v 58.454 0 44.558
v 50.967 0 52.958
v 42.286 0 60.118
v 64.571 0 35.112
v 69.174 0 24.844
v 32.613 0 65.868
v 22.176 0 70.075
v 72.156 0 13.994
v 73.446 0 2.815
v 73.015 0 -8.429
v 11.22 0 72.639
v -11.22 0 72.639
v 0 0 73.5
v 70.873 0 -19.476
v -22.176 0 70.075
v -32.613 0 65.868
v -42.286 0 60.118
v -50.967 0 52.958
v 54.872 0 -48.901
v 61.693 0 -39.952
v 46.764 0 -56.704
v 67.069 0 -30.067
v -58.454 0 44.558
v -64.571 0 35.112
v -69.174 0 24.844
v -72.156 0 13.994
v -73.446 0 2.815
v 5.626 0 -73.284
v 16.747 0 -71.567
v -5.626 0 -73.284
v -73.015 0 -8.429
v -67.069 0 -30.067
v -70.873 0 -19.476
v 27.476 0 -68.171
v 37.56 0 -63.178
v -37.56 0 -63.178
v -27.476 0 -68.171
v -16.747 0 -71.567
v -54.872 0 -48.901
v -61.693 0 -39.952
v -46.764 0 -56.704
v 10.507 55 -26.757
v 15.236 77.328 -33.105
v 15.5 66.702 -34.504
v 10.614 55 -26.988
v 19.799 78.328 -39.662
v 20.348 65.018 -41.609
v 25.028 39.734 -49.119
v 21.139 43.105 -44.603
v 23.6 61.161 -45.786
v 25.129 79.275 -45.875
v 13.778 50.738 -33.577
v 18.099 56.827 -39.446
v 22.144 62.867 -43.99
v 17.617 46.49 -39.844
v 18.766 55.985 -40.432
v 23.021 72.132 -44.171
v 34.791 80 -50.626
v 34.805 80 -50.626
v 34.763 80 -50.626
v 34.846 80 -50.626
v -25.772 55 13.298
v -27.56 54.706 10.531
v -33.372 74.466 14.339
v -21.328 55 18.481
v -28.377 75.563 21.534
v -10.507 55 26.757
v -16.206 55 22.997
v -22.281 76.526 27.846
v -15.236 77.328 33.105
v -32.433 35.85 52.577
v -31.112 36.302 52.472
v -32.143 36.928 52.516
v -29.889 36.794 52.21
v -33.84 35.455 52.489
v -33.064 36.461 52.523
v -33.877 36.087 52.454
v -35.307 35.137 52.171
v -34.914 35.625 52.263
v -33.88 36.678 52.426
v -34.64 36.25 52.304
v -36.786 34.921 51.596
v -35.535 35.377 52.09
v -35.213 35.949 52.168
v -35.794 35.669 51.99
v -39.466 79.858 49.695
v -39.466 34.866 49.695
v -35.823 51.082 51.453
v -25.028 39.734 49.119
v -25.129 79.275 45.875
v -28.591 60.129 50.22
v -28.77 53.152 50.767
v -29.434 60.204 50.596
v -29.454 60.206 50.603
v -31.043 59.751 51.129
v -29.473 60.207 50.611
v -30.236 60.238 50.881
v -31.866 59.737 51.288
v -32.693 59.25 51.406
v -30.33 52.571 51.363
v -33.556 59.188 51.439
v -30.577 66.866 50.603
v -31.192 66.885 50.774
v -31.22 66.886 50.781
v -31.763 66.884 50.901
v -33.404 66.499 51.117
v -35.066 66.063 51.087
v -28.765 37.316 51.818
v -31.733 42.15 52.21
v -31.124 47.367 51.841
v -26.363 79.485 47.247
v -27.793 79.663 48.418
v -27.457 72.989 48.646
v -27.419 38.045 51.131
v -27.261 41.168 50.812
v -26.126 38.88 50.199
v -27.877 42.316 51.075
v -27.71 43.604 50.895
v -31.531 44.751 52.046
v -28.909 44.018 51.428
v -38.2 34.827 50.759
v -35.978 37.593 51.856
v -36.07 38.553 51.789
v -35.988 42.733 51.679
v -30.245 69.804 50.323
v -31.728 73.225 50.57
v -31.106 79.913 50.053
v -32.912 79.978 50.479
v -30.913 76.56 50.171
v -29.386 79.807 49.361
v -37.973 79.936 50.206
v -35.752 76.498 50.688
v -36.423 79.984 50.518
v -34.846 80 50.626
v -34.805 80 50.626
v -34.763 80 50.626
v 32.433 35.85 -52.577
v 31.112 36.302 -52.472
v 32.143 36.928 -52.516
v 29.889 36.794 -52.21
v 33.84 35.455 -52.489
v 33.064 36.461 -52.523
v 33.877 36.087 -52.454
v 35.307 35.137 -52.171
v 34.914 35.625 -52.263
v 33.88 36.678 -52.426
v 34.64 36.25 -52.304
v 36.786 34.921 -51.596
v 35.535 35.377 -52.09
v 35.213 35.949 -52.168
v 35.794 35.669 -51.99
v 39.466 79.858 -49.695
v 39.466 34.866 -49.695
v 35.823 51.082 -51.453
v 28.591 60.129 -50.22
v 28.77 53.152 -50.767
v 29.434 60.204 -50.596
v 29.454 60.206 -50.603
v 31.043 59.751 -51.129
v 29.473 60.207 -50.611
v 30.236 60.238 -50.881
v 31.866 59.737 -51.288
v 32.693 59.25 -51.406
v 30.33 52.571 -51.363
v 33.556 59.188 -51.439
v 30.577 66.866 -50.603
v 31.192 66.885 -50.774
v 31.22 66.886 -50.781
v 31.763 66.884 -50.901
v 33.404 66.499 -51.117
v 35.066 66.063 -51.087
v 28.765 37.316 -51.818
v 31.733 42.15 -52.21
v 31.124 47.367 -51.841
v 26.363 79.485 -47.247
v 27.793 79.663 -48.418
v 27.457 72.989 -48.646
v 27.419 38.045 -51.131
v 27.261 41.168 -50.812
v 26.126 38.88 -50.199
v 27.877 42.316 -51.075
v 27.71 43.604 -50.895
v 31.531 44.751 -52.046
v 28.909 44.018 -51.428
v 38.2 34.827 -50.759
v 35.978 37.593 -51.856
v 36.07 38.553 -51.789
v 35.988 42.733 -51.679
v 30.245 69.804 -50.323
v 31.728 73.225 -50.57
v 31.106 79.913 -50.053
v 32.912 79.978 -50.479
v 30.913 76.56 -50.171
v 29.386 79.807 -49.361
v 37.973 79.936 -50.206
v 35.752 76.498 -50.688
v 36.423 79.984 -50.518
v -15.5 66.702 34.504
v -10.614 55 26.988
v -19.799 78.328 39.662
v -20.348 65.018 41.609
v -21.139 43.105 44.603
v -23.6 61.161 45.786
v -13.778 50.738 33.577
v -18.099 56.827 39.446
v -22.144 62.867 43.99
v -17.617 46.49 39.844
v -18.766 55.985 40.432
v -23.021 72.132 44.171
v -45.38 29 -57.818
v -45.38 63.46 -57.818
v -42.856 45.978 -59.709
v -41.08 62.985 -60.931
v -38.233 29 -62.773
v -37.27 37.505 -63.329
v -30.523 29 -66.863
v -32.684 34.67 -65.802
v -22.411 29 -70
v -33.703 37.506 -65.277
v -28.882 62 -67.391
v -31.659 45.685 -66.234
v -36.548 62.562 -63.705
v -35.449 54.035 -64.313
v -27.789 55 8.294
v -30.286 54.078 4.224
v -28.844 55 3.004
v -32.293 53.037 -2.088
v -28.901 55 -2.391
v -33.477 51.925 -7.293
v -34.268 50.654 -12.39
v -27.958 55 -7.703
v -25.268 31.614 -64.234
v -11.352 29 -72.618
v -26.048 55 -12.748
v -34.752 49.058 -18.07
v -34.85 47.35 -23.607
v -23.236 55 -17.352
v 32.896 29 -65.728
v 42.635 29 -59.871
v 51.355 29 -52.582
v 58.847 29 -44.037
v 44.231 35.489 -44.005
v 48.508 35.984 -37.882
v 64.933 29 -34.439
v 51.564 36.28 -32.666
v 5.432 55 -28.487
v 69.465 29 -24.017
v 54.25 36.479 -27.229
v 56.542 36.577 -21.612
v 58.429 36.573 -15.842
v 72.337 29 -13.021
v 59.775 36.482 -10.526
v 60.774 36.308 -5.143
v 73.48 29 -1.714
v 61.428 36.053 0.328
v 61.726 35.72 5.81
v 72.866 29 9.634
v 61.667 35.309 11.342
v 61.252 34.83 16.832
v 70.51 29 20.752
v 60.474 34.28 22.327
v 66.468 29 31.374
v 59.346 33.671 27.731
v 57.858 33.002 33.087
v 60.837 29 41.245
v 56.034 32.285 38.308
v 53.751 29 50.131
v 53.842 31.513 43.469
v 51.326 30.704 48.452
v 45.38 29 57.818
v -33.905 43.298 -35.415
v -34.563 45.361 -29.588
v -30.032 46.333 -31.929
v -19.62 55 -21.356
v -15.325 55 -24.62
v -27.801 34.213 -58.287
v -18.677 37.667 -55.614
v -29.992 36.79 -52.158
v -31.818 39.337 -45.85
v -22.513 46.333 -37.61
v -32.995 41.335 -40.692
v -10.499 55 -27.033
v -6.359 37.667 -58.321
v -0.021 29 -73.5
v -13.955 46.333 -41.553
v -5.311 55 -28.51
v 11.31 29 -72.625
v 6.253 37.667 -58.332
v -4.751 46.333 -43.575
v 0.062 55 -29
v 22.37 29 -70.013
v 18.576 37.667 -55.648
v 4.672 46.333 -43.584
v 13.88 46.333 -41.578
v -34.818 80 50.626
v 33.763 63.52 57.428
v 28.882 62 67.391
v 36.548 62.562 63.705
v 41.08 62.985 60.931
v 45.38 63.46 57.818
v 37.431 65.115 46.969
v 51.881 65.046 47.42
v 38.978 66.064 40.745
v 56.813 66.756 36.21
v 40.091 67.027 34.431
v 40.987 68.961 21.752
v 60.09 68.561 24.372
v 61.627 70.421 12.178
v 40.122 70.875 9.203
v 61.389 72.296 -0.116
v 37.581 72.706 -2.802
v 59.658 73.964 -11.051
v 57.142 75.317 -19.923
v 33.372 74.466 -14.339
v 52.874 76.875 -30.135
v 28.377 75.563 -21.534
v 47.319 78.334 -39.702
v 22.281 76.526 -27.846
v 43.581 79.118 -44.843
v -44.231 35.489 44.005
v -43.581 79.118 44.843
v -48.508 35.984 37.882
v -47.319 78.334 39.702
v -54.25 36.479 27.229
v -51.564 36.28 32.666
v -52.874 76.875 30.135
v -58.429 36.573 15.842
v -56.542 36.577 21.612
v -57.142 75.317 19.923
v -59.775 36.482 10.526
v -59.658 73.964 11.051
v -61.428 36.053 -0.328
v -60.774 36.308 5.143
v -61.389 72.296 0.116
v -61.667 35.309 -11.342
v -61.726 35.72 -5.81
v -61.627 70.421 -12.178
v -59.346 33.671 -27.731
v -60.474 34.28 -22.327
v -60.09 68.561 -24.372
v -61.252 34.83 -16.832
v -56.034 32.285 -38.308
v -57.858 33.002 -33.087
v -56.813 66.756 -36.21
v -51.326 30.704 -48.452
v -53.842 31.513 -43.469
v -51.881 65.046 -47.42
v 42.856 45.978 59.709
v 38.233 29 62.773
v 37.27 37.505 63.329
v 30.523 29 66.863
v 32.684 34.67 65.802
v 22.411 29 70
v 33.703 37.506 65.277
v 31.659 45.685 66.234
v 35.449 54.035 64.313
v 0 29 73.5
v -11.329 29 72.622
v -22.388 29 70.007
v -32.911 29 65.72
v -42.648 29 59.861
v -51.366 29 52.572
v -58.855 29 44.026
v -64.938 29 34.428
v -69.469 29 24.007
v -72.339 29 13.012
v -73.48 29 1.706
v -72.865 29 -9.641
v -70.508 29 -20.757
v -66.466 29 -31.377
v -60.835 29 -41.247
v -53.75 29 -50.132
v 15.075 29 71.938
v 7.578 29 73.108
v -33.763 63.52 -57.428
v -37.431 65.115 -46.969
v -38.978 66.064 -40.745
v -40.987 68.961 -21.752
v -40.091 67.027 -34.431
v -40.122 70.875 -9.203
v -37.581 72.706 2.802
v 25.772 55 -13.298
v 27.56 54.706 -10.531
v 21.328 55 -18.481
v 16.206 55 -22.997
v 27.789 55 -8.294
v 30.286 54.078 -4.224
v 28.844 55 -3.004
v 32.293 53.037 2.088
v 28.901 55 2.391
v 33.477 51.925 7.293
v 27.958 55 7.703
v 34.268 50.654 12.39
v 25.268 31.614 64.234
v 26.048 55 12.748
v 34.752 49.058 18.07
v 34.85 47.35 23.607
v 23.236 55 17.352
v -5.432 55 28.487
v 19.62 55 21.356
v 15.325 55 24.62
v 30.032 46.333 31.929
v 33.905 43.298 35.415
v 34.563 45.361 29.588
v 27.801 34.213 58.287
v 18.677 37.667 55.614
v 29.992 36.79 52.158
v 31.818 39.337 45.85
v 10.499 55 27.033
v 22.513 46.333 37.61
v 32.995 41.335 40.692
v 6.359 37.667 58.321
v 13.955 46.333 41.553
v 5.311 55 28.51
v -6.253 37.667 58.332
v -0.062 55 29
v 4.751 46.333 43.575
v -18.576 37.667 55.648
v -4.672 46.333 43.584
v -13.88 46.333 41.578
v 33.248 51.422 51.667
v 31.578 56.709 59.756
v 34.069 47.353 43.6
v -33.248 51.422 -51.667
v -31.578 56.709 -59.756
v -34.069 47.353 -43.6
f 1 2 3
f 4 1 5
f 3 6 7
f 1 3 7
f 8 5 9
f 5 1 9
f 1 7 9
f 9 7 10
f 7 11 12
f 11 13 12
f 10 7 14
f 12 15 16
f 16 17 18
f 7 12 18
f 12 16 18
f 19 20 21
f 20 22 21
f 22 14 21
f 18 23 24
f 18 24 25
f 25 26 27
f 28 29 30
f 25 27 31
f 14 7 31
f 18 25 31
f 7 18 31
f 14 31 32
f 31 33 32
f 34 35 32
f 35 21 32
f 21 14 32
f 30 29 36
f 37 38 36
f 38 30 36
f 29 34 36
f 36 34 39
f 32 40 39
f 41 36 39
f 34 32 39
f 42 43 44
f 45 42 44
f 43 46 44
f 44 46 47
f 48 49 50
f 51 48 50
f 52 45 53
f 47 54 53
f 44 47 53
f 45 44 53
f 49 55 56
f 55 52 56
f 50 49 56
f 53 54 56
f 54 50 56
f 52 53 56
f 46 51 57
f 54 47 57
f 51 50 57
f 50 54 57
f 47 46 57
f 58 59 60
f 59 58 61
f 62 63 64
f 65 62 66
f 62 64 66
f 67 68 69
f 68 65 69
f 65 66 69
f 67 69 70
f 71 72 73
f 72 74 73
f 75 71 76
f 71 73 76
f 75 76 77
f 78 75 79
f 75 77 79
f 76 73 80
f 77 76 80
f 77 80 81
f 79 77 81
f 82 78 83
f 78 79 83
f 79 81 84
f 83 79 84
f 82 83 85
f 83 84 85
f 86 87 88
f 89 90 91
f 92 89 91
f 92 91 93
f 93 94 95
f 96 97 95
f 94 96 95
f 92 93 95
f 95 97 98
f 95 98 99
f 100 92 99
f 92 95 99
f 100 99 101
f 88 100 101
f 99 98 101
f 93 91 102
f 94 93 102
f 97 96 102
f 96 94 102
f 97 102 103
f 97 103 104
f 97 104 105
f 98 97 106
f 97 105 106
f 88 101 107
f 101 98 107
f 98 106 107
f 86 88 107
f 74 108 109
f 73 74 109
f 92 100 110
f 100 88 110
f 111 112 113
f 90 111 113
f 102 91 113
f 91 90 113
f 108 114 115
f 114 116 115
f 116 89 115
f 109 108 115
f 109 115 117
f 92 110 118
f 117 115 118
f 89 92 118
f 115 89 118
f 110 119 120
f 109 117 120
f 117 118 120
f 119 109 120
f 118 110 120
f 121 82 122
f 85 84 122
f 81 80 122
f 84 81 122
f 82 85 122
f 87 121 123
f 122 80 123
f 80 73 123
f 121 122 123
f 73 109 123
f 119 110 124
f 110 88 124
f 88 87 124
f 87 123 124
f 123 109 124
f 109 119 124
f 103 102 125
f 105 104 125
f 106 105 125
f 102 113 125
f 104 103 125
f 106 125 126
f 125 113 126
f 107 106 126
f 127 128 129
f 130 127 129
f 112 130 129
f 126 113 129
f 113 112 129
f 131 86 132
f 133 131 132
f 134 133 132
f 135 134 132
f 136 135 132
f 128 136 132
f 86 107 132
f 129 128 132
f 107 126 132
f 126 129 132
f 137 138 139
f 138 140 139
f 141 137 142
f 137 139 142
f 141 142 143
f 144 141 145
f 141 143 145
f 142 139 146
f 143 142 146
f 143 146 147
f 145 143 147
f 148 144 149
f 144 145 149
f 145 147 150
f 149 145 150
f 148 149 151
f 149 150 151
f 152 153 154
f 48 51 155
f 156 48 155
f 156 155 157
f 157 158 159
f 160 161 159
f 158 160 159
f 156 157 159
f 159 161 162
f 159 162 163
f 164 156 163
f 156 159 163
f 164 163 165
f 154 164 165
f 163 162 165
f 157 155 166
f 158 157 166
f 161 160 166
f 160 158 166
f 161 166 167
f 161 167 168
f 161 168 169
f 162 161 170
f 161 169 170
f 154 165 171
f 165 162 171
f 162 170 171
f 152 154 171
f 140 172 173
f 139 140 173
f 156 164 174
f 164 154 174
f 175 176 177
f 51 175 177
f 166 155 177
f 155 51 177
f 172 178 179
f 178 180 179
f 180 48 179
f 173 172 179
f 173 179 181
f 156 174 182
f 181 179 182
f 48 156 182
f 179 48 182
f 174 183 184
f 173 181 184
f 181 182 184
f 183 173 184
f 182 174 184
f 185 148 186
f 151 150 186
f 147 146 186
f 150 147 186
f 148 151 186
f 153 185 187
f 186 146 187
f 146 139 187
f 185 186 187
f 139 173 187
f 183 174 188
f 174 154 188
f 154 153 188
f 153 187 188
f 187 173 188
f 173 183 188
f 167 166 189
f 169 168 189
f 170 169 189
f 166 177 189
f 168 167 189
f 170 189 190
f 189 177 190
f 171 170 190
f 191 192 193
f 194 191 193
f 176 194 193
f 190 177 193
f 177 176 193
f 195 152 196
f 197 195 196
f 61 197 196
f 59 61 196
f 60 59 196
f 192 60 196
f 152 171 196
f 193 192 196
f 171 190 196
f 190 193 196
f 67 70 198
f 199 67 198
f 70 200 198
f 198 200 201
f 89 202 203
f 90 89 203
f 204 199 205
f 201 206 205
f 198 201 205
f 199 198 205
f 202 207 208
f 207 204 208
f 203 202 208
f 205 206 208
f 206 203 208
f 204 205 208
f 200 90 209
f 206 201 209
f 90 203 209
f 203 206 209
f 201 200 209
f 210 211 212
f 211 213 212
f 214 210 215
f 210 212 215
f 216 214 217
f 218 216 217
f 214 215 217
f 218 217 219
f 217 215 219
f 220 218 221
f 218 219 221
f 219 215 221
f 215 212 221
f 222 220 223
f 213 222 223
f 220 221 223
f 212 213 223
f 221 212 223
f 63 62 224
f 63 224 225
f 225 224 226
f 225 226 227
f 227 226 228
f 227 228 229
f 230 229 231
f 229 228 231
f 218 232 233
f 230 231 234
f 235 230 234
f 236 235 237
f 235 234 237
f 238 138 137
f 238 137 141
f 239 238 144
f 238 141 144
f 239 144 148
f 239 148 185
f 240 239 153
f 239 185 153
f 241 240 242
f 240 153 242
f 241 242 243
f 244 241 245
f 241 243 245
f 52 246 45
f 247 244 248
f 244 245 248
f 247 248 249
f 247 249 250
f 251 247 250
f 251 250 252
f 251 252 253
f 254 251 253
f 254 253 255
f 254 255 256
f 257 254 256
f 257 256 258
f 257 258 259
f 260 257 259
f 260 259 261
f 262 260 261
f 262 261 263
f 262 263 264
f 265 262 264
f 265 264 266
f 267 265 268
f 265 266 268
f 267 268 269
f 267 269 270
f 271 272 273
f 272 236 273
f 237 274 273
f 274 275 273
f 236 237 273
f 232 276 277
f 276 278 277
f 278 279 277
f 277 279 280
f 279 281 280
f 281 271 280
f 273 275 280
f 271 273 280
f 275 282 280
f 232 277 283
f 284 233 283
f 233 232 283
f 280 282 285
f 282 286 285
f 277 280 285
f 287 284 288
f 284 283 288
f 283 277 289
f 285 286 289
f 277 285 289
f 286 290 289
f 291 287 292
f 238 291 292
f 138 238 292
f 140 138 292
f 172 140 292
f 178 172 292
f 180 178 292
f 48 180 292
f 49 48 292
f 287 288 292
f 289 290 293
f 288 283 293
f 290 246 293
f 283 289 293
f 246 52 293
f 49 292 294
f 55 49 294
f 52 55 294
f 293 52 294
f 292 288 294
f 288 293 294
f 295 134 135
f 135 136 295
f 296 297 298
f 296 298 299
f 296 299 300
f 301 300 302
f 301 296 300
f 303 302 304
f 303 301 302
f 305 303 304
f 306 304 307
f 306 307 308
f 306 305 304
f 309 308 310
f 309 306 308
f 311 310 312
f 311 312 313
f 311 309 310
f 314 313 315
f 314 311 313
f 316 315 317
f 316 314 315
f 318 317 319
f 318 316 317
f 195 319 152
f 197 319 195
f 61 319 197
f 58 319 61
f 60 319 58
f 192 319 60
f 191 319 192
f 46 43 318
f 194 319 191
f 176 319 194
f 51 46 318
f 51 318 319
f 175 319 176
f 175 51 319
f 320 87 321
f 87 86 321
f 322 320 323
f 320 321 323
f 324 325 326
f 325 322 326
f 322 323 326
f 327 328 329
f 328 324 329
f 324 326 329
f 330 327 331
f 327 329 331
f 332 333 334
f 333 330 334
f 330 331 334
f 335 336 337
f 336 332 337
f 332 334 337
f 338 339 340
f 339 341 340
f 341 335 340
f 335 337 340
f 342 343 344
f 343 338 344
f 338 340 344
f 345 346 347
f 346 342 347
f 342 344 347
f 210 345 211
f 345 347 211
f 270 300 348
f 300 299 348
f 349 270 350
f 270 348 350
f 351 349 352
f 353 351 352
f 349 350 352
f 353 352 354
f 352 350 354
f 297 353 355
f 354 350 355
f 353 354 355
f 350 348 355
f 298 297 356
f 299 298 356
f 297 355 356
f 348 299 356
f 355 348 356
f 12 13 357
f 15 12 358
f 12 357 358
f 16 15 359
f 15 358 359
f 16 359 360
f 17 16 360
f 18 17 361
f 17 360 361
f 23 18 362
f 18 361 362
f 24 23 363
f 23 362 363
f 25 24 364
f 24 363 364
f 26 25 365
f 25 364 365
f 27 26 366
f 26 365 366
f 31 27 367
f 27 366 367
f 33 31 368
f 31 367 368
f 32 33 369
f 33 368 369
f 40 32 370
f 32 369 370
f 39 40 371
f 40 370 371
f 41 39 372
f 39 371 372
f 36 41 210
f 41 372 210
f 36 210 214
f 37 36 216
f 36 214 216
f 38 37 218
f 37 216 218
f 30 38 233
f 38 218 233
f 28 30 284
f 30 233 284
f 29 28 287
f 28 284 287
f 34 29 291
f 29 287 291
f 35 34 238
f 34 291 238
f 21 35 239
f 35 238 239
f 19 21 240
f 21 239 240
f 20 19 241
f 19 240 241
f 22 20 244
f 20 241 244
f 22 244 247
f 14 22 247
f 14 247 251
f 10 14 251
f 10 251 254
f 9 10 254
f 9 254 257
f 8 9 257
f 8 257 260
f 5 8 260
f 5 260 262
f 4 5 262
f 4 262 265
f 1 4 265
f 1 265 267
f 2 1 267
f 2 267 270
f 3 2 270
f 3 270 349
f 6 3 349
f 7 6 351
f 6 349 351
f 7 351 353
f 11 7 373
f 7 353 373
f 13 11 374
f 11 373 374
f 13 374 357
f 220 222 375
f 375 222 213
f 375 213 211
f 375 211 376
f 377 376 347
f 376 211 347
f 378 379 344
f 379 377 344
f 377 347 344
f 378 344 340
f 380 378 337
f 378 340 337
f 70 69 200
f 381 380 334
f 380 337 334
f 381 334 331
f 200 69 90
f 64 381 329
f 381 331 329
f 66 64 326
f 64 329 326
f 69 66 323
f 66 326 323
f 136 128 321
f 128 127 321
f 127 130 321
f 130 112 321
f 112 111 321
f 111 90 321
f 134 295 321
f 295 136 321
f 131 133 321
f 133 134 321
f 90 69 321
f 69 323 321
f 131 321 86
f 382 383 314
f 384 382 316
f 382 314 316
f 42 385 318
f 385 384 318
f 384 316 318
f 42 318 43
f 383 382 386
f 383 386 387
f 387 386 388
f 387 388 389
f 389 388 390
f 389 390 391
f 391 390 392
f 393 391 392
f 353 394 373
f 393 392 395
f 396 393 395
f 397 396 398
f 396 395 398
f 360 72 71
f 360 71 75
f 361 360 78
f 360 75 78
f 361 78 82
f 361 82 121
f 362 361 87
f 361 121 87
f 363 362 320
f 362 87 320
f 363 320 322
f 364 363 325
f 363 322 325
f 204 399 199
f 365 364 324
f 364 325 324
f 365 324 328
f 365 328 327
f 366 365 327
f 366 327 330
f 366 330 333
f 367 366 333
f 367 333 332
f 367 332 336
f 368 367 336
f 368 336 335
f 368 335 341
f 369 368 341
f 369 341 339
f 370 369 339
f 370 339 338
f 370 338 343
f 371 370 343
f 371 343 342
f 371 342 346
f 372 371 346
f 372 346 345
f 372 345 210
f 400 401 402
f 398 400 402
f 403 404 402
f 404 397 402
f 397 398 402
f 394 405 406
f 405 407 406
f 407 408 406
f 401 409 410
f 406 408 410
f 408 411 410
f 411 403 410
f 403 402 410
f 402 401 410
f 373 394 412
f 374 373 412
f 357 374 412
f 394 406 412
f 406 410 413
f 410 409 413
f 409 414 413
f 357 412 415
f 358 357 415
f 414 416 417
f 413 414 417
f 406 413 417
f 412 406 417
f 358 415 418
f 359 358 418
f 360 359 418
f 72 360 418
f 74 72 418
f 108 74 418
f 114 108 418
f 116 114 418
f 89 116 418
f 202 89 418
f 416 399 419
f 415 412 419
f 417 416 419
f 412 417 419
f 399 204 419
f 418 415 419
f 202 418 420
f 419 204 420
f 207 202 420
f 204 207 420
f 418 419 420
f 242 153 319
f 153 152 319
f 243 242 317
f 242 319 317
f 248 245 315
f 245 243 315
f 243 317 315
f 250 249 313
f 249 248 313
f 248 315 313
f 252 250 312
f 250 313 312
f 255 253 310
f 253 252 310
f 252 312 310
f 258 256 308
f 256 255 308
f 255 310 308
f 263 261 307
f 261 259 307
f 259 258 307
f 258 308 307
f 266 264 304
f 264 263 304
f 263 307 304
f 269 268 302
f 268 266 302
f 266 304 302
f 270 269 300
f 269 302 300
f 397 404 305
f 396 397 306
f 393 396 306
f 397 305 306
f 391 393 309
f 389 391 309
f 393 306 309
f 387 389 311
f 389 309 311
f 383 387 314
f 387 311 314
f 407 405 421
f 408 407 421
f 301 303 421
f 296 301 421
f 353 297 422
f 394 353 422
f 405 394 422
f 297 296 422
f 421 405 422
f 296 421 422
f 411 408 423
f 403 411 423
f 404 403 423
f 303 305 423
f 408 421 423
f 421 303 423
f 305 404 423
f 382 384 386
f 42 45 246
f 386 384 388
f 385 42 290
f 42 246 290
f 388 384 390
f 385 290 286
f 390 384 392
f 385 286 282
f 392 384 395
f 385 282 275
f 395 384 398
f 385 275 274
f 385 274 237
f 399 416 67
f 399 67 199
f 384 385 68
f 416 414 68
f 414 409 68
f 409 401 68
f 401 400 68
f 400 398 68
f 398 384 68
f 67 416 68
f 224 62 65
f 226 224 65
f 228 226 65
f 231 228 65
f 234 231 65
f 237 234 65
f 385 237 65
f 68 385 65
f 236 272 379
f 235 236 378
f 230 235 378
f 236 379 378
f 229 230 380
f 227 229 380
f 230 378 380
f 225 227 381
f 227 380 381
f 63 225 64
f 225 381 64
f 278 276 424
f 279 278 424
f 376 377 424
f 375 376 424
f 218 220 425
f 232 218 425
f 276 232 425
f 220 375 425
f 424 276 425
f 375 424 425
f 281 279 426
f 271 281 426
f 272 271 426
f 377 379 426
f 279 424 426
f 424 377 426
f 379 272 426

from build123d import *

# Parameters (mm, degrees)
CUT_EXTRUDE_1_DEPTH      = 132.165925626
CUT_EXTRUDE_1_DEPTH_BACK = 132.165925626
PATTERN_CIRCULAR_1_COUNT = 2
CUT_EXTRUDE_2_DEPTH      = 132.165925626


with BuildPart() as part:
    # Эскиз1 → Повернуть1 (revolve)
    with BuildSketch(Plane.XY, mode=Mode.PRIVATE) as revolve_1_sk:
        Polygon((0, 0), (-73.5, 0), (-73.5, 29), (-29, 55), (0, 55), align=None)
    revolve(revolve_1_sk.sketch.rotate(Axis((0, 0, 0), (0, -1, 0)), 270), axis=Axis((0, 0, 0), (0, -1, 0)))

    # Эскиз2 for По сечениям2 → По сечениям2 section 0
    with BuildSketch(Plane(origin=(0, 29, 0), x_dir=(-1, 0, 0), z_dir=(0, -1, 0))):
        with BuildLine():
            # circular arc as an exact rational Bezier (weights 1, cos(half-angle), 1)
            Bezier((39.466469787, -49.694809123), (86.422497659, 1.641217724), (45.380271287, 57.817652822), weights=[1, 0.773839067, 1])
            Bezier((45.380271287, 57.817652822), (34.990210983, 65.972666599), (22.410934831, 70), weights=[1, 0.984234087, 1])
            Bezier((22.410934831, 70), (39.972131567, 31.613018677), (20, -5.576629433), weights=[1, 0.895632627, 1])
            Bezier((20, -5.576629433), (14.31567319, -14.44600737), (5, -19.364916731), weights=[1, 0.96702533, 1])
            Bezier((5, -19.364916731), (11.820283108, -36.758324694), (25, -50), weights=[1, 0.979126148, 1])
            Bezier((25, -50), (32.393156545, -57.42791209), (39.466469787, -49.694809123), weights=[1, 0.690340696, 1])
        make_face()
    # Эскиз3 for По сечениям2 → По сечениям2 section 1
    with BuildSketch(Plane(origin=(0, 80, 0), x_dir=(1, 0, 0), z_dir=(0, 1, 0))):
        with BuildLine():
            Bezier((-32.410934831, 65.968032435), (-39.322570908, 62.57225757), (-45.380271287, 57.817652822), weights=[1, 0.994556139, 1])
            Bezier((-45.380271287, 57.817652822), (-86.422497659, 1.641217724), (-39.466469787, -49.694809123), weights=[1, 0.773839067, 1])
            Bezier((-39.466469787, -49.694809123), (-30.797796987, -53.302893985), (-25.13120111, -45.815981695), weights=[1, 0.790811163, 1])
            Bezier((-25.13120111, -45.815981695), (-19.944058149, -40.248445108), (-15.802261293, -33.864916731), weights=[1, 0.99619641, 1])
            Bezier((-15.802261293, -33.864916731), (-27.58094632, -26.902479263), (-35, -15.405932001), weights=[1, 0.973224743, 1])
            Bezier((-35, -15.405932001), (-55.902003331, 25.987274602), (-32.410934831, 65.968032435), weights=[1, 0.877862587, 1])
        make_face()
    loft_2 = loft()

    # Эскиз6 → Вырез-Вытянуть1 (cut, two sides: drawn at the far end of the back side and taken through both)
    with BuildSketch(Plane(origin=(0, 0, 0), x_dir=(0, 0, -1), z_dir=(1, 0, 0)).offset(-CUT_EXTRUDE_1_DEPTH_BACK)):
        Polygon((67.391079811, 62), (-50.626182403, 80), (-50.626182403, 96.194321308), (67.391079811, 98.711918652), align=None)
    extrude(amount=CUT_EXTRUDE_1_DEPTH + CUT_EXTRUDE_1_DEPTH_BACK, mode=Mode.SUBTRACT)

    # Круговой массив1: По сечениям2 ×2 about axis
    pattern_circular_1_axis = Axis((0, 0, 0), (0, 1, 0))
    for i in range(1, PATTERN_CIRCULAR_1_COUNT):
        add(loft_2.rotate(pattern_circular_1_axis, i * 360 / PATTERN_CIRCULAR_1_COUNT))

    # Эскиз7 → Вырез-Вытянуть2 (cut, through all)
    with BuildSketch(Plane(origin=(0, 0, 0), x_dir=(0, 0, -1), z_dir=(1, 0, 0))):
        Polygon((50.626182403, 80), (50.626182403, 117.416831393), (-67.391079811, 118.791932979), (-67.391079811, 62), align=None)
    extrude(amount=CUT_EXTRUDE_2_DEPTH, mode=Mode.SUBTRACT)


solid = part.part
